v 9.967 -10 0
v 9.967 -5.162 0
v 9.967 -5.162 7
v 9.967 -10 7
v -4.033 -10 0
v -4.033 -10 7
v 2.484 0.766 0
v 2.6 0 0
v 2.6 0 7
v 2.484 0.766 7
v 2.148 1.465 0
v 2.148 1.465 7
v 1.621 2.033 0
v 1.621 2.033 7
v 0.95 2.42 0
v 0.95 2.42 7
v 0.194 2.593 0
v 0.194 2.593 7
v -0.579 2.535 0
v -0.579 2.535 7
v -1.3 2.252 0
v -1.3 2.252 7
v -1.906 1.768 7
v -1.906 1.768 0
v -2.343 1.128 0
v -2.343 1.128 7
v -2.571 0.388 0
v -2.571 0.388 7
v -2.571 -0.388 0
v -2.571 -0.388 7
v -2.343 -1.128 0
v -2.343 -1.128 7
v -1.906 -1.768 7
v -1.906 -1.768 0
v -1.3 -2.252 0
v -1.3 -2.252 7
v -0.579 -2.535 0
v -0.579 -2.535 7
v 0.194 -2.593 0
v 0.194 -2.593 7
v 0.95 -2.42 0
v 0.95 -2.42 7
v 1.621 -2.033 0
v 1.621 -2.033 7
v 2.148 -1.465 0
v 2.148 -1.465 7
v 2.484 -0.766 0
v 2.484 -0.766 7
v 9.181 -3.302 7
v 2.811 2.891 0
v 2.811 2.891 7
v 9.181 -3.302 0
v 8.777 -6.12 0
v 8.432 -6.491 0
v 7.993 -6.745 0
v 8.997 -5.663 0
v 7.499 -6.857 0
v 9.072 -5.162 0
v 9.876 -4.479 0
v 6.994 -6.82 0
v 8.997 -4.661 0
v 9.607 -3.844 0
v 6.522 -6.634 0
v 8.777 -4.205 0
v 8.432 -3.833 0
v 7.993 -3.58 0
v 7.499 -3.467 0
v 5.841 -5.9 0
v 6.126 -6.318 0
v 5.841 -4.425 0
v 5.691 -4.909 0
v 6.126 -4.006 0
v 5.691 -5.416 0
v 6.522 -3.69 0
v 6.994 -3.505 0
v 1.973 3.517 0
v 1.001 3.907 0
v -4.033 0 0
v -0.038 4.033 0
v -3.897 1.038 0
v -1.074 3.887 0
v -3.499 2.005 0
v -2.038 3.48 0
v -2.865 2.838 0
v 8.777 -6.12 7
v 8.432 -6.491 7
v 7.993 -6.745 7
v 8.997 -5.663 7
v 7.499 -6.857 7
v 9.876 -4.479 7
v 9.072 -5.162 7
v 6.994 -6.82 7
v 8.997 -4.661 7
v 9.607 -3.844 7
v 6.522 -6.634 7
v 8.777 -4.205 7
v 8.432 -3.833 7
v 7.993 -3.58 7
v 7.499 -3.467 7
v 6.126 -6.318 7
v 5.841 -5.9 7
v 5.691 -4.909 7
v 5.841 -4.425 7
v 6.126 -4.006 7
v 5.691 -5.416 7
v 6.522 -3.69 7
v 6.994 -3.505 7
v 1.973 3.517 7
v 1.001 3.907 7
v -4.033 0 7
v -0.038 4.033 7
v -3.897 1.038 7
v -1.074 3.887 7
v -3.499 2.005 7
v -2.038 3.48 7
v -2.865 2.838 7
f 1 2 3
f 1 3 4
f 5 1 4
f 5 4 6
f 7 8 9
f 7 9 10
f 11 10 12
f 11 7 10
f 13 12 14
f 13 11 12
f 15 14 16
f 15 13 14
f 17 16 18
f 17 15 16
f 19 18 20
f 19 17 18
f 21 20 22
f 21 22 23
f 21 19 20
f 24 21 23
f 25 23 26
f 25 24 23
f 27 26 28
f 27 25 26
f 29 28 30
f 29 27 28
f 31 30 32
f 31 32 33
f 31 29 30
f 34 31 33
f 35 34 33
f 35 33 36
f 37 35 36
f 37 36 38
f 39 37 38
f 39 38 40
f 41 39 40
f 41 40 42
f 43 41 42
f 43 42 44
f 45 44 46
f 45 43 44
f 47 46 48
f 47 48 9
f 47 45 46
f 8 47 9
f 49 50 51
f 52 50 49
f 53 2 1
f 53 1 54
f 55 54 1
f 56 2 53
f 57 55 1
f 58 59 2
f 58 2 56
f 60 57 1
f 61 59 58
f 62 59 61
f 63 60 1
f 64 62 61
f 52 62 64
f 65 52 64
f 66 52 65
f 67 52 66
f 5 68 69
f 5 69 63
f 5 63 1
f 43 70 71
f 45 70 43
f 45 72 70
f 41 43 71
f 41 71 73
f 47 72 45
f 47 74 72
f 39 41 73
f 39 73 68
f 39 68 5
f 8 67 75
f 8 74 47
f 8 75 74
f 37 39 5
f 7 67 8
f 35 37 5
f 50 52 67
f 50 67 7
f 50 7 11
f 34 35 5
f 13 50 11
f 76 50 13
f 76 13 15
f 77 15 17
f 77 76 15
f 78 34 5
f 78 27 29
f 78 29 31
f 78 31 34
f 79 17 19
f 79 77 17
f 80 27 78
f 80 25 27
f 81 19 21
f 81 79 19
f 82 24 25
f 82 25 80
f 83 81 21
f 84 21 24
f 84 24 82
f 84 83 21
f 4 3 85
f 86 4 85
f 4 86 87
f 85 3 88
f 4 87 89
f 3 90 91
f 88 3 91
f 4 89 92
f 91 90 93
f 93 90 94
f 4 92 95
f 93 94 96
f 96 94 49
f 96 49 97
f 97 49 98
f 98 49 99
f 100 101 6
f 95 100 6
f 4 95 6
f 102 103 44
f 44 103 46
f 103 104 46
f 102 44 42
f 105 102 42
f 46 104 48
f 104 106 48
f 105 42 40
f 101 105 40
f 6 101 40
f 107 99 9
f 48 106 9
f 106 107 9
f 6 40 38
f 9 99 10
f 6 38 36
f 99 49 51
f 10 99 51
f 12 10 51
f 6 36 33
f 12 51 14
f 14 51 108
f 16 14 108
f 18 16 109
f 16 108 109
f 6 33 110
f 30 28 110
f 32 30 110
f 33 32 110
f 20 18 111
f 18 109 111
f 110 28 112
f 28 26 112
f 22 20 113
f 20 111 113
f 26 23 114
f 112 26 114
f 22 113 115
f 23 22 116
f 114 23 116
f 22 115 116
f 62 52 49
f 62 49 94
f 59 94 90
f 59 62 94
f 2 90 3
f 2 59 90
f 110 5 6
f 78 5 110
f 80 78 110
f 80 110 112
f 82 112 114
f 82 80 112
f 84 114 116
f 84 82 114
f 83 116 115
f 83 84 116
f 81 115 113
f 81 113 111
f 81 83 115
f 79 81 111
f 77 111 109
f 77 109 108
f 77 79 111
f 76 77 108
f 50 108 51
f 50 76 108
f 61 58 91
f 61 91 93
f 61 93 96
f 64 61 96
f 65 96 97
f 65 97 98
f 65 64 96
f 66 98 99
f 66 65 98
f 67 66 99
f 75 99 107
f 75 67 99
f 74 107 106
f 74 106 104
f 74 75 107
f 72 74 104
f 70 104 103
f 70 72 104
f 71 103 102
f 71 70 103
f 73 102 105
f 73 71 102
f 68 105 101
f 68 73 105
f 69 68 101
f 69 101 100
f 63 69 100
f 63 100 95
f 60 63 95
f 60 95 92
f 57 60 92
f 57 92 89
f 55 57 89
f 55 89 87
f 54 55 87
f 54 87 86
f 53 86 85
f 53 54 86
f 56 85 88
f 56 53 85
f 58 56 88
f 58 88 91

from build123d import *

# Parameters (mm, degrees)
CROQUIS1_R              = 2.6
CROQUIS1_R_2            = 1.7
SALIENTE_EXTRUIR1_DEPTH = 7


with BuildPart() as part:
    # Croquis1 → Saliente-Extruir1 (new body)
    with BuildSketch(Plane.XY):
        with BuildLine():
            Line((2.811164445, 2.891458498), (9.18120322, -3.301688153))
            ThreePointArc((9.18120322, -3.301688153), (9.762664554, -4.15232303), (9.967236954, -5.162187927))
            Line((9.967236954, -5.162187927), (9.967236954, -10))
            Line((9.967236954, -10), (-4.032763046, -10))
            Line((-4.032763046, -10), (-4.032763046, 0))
            ThreePointArc((-4.032763046, 0), (-1.569461324, 3.714830944), (2.811164445, 2.891458498))
        make_face()
        Circle(CROQUIS1_R, mode=Mode.SUBTRACT)
        with Locations((7.372368399, -5.162187927)):
            Circle(CROQUIS1_R_2, mode=Mode.SUBTRACT)
    extrude(amount=SALIENTE_EXTRUIR1_DEPTH)


solid = part.part
